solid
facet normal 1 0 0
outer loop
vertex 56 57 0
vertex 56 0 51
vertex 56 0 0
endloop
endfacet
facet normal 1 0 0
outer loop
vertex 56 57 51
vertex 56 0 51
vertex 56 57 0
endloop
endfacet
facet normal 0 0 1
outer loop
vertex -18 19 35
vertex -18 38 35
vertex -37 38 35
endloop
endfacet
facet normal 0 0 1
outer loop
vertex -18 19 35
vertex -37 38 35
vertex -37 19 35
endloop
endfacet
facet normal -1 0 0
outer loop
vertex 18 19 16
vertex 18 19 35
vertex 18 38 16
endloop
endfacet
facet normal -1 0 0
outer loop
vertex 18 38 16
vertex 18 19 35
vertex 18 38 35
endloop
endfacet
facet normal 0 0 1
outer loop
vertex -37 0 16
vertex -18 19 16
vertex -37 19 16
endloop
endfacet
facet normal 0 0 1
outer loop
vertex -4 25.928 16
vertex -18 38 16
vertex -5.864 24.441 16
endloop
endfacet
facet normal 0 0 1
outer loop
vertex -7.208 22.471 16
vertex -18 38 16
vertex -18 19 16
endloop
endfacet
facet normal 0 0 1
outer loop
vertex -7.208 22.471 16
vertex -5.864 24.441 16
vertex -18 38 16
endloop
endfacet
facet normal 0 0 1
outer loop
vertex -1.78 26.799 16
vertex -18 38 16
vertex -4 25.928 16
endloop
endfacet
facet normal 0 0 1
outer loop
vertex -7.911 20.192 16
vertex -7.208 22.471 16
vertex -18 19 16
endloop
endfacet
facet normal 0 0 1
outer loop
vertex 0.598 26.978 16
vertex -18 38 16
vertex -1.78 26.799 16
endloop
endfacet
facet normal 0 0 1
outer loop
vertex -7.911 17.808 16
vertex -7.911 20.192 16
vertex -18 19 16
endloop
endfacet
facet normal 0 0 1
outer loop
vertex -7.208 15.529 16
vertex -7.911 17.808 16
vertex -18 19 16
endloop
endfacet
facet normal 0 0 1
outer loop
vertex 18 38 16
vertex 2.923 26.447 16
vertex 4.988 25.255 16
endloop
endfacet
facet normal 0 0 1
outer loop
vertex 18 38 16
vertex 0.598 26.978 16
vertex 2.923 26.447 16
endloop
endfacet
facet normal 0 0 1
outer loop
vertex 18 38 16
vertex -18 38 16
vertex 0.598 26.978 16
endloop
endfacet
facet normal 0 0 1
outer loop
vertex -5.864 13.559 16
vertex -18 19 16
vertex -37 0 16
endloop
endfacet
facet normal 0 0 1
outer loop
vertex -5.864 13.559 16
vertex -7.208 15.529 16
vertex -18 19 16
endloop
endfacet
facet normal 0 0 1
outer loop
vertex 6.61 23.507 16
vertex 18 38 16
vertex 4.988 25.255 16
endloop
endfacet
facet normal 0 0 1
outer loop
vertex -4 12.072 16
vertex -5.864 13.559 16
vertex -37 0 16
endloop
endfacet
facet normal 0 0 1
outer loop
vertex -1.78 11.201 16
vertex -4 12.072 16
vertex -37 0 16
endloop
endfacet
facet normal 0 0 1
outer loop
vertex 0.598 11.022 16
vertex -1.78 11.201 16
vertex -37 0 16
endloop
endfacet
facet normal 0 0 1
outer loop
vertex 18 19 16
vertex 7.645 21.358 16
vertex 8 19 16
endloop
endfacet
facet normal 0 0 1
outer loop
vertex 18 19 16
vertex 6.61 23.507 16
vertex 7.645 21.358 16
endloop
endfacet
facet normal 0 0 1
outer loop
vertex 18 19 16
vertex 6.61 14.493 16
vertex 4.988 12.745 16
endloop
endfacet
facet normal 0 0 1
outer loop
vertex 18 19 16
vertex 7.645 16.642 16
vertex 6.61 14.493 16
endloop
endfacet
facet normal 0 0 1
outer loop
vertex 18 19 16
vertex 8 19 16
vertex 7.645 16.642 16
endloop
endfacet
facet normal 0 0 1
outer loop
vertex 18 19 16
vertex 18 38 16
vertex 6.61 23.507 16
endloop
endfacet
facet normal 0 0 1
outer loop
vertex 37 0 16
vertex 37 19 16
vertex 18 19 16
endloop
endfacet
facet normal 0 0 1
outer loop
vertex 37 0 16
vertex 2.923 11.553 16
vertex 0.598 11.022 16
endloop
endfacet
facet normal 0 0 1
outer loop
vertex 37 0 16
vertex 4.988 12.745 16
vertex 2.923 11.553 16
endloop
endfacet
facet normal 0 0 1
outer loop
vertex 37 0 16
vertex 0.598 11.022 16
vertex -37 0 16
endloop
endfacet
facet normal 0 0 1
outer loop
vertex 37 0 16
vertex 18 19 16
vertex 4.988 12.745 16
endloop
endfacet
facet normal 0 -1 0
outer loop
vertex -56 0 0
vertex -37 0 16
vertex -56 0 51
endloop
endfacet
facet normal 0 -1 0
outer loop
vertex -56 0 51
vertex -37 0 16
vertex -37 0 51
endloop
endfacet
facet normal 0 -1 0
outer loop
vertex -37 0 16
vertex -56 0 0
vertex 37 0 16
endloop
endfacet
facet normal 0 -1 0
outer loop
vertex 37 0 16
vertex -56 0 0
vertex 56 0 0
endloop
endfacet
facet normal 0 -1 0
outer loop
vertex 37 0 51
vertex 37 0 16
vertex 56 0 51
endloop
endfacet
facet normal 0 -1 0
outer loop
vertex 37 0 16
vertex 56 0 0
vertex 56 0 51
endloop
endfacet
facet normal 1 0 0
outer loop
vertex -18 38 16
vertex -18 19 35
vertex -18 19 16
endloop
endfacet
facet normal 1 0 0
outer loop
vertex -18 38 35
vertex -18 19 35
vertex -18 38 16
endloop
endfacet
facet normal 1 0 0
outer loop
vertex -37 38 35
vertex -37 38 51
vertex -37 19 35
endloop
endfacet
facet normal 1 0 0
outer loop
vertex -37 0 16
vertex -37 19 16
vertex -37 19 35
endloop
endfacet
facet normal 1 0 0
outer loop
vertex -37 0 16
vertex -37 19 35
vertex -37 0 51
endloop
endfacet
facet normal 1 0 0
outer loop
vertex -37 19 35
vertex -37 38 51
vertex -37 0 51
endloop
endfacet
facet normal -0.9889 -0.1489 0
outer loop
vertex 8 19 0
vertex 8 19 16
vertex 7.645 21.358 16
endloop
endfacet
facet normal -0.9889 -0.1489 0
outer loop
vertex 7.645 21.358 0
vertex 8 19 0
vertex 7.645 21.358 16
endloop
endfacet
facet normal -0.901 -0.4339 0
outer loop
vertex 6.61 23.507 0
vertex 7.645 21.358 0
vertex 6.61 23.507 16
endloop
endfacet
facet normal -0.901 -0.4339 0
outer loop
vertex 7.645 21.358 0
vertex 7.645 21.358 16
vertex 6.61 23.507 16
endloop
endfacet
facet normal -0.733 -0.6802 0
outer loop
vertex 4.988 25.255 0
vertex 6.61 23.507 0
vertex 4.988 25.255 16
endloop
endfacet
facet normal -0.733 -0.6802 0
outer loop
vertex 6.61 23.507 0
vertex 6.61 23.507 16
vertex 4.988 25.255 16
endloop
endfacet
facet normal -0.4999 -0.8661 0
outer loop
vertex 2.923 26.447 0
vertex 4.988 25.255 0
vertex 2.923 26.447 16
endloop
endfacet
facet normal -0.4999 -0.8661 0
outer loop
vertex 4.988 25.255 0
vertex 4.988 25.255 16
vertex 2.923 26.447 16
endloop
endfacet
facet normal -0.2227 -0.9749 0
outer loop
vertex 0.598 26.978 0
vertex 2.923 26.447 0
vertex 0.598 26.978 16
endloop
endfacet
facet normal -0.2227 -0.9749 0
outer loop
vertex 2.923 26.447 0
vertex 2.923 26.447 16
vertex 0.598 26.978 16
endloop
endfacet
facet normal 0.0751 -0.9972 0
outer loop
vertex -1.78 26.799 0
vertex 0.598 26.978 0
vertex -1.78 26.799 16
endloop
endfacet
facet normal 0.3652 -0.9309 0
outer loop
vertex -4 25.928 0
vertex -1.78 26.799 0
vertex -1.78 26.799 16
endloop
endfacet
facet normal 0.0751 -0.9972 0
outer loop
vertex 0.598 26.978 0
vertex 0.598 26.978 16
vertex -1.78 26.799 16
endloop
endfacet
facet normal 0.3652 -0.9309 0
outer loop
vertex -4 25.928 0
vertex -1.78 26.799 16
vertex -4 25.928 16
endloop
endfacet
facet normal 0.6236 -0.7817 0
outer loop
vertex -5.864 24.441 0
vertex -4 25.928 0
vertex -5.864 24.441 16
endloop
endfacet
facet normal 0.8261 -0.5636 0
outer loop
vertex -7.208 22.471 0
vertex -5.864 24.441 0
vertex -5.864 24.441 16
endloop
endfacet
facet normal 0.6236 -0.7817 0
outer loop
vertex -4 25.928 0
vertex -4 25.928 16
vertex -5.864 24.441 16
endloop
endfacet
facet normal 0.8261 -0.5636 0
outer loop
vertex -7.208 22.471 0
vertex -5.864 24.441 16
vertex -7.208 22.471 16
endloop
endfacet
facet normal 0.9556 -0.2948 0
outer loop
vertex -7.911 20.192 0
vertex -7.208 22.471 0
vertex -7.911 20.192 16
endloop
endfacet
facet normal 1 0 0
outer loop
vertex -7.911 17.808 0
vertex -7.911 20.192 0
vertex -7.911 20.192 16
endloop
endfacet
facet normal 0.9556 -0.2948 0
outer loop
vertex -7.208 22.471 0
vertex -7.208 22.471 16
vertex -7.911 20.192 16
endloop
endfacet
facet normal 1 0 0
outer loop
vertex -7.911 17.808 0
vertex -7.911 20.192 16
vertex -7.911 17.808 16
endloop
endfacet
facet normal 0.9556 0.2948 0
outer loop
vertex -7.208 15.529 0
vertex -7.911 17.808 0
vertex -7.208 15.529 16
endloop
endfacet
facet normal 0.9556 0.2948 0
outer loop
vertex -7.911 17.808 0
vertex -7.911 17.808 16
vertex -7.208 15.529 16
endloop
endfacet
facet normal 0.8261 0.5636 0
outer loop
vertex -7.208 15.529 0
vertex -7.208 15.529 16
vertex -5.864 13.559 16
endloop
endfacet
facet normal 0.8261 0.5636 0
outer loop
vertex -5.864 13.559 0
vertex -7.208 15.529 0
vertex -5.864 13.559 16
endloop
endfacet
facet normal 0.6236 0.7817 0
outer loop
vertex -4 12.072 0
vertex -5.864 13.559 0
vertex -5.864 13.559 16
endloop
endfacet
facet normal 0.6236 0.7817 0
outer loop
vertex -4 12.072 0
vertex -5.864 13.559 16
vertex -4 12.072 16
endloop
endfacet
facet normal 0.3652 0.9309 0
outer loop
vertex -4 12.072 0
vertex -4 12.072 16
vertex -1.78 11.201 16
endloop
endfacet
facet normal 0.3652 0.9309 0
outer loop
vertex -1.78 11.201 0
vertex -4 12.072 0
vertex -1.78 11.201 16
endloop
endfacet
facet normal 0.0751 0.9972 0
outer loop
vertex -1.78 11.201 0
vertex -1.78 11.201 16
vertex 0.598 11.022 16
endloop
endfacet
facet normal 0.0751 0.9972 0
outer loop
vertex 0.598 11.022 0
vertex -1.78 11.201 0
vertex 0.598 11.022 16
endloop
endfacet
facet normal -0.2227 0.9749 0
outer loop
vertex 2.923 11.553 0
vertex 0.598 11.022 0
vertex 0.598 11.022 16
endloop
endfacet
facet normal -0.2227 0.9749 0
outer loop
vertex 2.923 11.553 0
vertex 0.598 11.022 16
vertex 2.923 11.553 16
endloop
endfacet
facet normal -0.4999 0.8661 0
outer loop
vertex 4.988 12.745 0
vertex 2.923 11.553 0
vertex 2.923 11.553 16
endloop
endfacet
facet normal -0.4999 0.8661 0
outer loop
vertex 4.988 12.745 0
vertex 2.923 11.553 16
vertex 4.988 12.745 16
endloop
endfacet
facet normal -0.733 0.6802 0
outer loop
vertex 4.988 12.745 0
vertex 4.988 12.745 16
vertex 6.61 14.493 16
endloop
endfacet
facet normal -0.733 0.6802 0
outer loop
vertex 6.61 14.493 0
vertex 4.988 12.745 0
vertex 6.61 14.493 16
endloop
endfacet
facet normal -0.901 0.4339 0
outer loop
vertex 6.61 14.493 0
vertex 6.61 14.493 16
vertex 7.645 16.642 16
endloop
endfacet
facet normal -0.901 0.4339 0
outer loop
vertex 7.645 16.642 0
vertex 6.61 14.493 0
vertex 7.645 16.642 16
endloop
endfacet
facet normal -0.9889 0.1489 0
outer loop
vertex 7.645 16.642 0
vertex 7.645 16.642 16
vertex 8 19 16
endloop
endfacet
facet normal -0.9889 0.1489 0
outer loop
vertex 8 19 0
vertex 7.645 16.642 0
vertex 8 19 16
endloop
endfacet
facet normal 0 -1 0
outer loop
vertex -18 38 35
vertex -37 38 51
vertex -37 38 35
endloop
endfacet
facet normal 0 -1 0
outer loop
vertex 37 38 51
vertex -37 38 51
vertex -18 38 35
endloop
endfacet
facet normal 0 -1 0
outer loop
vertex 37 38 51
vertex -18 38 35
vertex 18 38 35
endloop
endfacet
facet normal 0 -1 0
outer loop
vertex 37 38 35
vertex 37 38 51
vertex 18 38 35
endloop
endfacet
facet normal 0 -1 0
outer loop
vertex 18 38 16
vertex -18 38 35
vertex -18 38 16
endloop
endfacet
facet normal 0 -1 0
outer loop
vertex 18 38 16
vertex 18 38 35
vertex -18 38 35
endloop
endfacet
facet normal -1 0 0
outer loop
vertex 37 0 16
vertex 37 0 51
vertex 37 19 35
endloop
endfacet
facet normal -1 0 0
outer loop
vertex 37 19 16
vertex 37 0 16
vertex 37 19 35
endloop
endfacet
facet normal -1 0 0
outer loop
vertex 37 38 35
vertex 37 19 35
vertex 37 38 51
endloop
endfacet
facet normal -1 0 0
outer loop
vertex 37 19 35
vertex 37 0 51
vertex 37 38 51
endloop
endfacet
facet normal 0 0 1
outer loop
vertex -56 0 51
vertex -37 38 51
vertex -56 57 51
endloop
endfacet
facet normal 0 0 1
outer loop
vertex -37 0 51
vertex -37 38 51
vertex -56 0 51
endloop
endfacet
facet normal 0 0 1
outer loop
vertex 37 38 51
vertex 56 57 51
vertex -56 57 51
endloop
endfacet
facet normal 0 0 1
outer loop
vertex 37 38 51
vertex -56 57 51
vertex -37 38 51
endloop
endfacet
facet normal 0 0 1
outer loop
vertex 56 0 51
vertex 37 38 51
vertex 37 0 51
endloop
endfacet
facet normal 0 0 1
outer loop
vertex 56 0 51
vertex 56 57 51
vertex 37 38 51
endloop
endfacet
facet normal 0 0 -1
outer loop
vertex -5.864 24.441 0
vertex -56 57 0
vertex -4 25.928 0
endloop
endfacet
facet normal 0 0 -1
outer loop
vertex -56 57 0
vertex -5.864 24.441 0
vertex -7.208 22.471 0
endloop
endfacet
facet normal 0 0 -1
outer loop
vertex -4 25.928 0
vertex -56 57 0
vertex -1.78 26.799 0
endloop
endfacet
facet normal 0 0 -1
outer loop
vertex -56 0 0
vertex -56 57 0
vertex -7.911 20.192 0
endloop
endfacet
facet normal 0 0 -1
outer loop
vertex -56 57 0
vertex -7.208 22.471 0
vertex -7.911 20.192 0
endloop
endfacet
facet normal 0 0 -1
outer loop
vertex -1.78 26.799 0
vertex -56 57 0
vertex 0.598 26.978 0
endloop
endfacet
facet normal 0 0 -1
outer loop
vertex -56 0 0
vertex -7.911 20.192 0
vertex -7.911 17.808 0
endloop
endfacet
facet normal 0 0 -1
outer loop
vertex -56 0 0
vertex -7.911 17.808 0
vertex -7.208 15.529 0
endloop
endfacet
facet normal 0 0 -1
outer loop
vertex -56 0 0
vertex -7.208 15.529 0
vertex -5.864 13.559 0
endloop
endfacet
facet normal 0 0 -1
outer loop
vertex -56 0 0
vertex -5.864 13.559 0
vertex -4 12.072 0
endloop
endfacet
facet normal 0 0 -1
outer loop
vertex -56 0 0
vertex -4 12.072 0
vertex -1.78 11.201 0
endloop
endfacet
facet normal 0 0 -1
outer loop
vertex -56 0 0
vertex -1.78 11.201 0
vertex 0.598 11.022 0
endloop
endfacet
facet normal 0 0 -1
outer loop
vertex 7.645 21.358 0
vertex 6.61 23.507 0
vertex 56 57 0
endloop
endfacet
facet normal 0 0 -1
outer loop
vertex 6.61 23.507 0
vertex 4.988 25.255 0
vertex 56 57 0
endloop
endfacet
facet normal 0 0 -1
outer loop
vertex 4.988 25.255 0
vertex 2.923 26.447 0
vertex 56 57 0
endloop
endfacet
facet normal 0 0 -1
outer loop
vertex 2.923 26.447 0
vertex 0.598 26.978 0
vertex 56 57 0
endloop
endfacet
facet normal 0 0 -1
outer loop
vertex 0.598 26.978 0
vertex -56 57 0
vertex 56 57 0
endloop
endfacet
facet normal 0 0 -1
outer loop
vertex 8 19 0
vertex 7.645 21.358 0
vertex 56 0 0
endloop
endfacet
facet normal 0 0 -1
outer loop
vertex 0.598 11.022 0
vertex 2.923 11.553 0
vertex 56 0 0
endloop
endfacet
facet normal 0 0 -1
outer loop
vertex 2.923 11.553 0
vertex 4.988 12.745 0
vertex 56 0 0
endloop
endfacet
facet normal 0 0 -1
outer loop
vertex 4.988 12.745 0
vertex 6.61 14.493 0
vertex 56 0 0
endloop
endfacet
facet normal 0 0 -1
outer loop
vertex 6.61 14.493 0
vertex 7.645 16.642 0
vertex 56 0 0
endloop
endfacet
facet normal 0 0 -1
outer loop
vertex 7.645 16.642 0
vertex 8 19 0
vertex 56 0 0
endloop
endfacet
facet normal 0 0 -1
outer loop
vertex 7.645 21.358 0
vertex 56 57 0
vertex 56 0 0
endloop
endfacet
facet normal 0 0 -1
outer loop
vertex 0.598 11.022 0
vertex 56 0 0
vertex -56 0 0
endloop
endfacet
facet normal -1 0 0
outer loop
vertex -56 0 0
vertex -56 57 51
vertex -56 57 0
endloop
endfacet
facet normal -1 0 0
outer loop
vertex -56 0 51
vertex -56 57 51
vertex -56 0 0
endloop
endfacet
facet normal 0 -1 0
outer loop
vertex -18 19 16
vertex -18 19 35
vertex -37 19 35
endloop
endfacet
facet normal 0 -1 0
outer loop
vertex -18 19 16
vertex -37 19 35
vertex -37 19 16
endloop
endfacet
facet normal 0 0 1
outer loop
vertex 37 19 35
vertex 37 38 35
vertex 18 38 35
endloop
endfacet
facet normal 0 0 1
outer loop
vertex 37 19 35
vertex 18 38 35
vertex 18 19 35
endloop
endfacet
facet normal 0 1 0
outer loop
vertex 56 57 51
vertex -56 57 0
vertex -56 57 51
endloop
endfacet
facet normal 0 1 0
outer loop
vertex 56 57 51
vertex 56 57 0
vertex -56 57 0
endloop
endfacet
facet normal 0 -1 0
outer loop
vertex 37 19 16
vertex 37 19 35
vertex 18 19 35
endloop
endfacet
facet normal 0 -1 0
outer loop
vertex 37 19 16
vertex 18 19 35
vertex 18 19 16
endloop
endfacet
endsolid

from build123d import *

# Parameters (mm, degrees)
F1_DEPTH = 37
F2_W     = 36
F2_H     = 19
F3_DEPTH = 19
F4_W     = 57
F4_H     = 51
F5_DEPTH = 19
F6_W     = 57
F6_H     = 51
F7_DEPTH = 19
F8_R     = 8
F9_DEPTH = 51


with BuildPart() as f1:
    # F0 (on Right) → F1 (new body, symmetric)
    with BuildSketch(Plane.YZ):
        Polygon((0, 16), (0, 0), (57, 0), (57, 51), (38, 51), (38, 35), (19, 35), (19, 16), align=None)
    extrude(amount=F1_DEPTH, both=True)

    # F2 (on face) → F3 (cut)
    with BuildSketch(Plane.XY.offset(35)):
        with Locations((0, 28.5)):
            Rectangle(F2_W, F2_H)
    extrude(amount=-F3_DEPTH, mode=Mode.SUBTRACT)

    # F4 (on face) → F5 (join)
    with BuildSketch(Plane.YZ.offset(37)):
        with Locations((28.5, 25.5)):
            Rectangle(F4_W, F4_H)
    extrude(amount=F5_DEPTH)

    # F6 (on face) → F7 (join)
    with BuildSketch(Plane(origin=(-37, 0, 0), x_dir=(0, -1, 0), z_dir=(-1, 0, 0))):
        with Locations((-28.5, 25.5)):
            Rectangle(F6_W, F6_H)
    extrude(amount=F7_DEPTH)

    # F8 (on face) → F9 (cut)
    with BuildSketch(Plane.XY.offset(16)):
        with Locations((0, 19)):
            Circle(F8_R)
    extrude(amount=-F9_DEPTH, mode=Mode.SUBTRACT)


solid = f1.part
